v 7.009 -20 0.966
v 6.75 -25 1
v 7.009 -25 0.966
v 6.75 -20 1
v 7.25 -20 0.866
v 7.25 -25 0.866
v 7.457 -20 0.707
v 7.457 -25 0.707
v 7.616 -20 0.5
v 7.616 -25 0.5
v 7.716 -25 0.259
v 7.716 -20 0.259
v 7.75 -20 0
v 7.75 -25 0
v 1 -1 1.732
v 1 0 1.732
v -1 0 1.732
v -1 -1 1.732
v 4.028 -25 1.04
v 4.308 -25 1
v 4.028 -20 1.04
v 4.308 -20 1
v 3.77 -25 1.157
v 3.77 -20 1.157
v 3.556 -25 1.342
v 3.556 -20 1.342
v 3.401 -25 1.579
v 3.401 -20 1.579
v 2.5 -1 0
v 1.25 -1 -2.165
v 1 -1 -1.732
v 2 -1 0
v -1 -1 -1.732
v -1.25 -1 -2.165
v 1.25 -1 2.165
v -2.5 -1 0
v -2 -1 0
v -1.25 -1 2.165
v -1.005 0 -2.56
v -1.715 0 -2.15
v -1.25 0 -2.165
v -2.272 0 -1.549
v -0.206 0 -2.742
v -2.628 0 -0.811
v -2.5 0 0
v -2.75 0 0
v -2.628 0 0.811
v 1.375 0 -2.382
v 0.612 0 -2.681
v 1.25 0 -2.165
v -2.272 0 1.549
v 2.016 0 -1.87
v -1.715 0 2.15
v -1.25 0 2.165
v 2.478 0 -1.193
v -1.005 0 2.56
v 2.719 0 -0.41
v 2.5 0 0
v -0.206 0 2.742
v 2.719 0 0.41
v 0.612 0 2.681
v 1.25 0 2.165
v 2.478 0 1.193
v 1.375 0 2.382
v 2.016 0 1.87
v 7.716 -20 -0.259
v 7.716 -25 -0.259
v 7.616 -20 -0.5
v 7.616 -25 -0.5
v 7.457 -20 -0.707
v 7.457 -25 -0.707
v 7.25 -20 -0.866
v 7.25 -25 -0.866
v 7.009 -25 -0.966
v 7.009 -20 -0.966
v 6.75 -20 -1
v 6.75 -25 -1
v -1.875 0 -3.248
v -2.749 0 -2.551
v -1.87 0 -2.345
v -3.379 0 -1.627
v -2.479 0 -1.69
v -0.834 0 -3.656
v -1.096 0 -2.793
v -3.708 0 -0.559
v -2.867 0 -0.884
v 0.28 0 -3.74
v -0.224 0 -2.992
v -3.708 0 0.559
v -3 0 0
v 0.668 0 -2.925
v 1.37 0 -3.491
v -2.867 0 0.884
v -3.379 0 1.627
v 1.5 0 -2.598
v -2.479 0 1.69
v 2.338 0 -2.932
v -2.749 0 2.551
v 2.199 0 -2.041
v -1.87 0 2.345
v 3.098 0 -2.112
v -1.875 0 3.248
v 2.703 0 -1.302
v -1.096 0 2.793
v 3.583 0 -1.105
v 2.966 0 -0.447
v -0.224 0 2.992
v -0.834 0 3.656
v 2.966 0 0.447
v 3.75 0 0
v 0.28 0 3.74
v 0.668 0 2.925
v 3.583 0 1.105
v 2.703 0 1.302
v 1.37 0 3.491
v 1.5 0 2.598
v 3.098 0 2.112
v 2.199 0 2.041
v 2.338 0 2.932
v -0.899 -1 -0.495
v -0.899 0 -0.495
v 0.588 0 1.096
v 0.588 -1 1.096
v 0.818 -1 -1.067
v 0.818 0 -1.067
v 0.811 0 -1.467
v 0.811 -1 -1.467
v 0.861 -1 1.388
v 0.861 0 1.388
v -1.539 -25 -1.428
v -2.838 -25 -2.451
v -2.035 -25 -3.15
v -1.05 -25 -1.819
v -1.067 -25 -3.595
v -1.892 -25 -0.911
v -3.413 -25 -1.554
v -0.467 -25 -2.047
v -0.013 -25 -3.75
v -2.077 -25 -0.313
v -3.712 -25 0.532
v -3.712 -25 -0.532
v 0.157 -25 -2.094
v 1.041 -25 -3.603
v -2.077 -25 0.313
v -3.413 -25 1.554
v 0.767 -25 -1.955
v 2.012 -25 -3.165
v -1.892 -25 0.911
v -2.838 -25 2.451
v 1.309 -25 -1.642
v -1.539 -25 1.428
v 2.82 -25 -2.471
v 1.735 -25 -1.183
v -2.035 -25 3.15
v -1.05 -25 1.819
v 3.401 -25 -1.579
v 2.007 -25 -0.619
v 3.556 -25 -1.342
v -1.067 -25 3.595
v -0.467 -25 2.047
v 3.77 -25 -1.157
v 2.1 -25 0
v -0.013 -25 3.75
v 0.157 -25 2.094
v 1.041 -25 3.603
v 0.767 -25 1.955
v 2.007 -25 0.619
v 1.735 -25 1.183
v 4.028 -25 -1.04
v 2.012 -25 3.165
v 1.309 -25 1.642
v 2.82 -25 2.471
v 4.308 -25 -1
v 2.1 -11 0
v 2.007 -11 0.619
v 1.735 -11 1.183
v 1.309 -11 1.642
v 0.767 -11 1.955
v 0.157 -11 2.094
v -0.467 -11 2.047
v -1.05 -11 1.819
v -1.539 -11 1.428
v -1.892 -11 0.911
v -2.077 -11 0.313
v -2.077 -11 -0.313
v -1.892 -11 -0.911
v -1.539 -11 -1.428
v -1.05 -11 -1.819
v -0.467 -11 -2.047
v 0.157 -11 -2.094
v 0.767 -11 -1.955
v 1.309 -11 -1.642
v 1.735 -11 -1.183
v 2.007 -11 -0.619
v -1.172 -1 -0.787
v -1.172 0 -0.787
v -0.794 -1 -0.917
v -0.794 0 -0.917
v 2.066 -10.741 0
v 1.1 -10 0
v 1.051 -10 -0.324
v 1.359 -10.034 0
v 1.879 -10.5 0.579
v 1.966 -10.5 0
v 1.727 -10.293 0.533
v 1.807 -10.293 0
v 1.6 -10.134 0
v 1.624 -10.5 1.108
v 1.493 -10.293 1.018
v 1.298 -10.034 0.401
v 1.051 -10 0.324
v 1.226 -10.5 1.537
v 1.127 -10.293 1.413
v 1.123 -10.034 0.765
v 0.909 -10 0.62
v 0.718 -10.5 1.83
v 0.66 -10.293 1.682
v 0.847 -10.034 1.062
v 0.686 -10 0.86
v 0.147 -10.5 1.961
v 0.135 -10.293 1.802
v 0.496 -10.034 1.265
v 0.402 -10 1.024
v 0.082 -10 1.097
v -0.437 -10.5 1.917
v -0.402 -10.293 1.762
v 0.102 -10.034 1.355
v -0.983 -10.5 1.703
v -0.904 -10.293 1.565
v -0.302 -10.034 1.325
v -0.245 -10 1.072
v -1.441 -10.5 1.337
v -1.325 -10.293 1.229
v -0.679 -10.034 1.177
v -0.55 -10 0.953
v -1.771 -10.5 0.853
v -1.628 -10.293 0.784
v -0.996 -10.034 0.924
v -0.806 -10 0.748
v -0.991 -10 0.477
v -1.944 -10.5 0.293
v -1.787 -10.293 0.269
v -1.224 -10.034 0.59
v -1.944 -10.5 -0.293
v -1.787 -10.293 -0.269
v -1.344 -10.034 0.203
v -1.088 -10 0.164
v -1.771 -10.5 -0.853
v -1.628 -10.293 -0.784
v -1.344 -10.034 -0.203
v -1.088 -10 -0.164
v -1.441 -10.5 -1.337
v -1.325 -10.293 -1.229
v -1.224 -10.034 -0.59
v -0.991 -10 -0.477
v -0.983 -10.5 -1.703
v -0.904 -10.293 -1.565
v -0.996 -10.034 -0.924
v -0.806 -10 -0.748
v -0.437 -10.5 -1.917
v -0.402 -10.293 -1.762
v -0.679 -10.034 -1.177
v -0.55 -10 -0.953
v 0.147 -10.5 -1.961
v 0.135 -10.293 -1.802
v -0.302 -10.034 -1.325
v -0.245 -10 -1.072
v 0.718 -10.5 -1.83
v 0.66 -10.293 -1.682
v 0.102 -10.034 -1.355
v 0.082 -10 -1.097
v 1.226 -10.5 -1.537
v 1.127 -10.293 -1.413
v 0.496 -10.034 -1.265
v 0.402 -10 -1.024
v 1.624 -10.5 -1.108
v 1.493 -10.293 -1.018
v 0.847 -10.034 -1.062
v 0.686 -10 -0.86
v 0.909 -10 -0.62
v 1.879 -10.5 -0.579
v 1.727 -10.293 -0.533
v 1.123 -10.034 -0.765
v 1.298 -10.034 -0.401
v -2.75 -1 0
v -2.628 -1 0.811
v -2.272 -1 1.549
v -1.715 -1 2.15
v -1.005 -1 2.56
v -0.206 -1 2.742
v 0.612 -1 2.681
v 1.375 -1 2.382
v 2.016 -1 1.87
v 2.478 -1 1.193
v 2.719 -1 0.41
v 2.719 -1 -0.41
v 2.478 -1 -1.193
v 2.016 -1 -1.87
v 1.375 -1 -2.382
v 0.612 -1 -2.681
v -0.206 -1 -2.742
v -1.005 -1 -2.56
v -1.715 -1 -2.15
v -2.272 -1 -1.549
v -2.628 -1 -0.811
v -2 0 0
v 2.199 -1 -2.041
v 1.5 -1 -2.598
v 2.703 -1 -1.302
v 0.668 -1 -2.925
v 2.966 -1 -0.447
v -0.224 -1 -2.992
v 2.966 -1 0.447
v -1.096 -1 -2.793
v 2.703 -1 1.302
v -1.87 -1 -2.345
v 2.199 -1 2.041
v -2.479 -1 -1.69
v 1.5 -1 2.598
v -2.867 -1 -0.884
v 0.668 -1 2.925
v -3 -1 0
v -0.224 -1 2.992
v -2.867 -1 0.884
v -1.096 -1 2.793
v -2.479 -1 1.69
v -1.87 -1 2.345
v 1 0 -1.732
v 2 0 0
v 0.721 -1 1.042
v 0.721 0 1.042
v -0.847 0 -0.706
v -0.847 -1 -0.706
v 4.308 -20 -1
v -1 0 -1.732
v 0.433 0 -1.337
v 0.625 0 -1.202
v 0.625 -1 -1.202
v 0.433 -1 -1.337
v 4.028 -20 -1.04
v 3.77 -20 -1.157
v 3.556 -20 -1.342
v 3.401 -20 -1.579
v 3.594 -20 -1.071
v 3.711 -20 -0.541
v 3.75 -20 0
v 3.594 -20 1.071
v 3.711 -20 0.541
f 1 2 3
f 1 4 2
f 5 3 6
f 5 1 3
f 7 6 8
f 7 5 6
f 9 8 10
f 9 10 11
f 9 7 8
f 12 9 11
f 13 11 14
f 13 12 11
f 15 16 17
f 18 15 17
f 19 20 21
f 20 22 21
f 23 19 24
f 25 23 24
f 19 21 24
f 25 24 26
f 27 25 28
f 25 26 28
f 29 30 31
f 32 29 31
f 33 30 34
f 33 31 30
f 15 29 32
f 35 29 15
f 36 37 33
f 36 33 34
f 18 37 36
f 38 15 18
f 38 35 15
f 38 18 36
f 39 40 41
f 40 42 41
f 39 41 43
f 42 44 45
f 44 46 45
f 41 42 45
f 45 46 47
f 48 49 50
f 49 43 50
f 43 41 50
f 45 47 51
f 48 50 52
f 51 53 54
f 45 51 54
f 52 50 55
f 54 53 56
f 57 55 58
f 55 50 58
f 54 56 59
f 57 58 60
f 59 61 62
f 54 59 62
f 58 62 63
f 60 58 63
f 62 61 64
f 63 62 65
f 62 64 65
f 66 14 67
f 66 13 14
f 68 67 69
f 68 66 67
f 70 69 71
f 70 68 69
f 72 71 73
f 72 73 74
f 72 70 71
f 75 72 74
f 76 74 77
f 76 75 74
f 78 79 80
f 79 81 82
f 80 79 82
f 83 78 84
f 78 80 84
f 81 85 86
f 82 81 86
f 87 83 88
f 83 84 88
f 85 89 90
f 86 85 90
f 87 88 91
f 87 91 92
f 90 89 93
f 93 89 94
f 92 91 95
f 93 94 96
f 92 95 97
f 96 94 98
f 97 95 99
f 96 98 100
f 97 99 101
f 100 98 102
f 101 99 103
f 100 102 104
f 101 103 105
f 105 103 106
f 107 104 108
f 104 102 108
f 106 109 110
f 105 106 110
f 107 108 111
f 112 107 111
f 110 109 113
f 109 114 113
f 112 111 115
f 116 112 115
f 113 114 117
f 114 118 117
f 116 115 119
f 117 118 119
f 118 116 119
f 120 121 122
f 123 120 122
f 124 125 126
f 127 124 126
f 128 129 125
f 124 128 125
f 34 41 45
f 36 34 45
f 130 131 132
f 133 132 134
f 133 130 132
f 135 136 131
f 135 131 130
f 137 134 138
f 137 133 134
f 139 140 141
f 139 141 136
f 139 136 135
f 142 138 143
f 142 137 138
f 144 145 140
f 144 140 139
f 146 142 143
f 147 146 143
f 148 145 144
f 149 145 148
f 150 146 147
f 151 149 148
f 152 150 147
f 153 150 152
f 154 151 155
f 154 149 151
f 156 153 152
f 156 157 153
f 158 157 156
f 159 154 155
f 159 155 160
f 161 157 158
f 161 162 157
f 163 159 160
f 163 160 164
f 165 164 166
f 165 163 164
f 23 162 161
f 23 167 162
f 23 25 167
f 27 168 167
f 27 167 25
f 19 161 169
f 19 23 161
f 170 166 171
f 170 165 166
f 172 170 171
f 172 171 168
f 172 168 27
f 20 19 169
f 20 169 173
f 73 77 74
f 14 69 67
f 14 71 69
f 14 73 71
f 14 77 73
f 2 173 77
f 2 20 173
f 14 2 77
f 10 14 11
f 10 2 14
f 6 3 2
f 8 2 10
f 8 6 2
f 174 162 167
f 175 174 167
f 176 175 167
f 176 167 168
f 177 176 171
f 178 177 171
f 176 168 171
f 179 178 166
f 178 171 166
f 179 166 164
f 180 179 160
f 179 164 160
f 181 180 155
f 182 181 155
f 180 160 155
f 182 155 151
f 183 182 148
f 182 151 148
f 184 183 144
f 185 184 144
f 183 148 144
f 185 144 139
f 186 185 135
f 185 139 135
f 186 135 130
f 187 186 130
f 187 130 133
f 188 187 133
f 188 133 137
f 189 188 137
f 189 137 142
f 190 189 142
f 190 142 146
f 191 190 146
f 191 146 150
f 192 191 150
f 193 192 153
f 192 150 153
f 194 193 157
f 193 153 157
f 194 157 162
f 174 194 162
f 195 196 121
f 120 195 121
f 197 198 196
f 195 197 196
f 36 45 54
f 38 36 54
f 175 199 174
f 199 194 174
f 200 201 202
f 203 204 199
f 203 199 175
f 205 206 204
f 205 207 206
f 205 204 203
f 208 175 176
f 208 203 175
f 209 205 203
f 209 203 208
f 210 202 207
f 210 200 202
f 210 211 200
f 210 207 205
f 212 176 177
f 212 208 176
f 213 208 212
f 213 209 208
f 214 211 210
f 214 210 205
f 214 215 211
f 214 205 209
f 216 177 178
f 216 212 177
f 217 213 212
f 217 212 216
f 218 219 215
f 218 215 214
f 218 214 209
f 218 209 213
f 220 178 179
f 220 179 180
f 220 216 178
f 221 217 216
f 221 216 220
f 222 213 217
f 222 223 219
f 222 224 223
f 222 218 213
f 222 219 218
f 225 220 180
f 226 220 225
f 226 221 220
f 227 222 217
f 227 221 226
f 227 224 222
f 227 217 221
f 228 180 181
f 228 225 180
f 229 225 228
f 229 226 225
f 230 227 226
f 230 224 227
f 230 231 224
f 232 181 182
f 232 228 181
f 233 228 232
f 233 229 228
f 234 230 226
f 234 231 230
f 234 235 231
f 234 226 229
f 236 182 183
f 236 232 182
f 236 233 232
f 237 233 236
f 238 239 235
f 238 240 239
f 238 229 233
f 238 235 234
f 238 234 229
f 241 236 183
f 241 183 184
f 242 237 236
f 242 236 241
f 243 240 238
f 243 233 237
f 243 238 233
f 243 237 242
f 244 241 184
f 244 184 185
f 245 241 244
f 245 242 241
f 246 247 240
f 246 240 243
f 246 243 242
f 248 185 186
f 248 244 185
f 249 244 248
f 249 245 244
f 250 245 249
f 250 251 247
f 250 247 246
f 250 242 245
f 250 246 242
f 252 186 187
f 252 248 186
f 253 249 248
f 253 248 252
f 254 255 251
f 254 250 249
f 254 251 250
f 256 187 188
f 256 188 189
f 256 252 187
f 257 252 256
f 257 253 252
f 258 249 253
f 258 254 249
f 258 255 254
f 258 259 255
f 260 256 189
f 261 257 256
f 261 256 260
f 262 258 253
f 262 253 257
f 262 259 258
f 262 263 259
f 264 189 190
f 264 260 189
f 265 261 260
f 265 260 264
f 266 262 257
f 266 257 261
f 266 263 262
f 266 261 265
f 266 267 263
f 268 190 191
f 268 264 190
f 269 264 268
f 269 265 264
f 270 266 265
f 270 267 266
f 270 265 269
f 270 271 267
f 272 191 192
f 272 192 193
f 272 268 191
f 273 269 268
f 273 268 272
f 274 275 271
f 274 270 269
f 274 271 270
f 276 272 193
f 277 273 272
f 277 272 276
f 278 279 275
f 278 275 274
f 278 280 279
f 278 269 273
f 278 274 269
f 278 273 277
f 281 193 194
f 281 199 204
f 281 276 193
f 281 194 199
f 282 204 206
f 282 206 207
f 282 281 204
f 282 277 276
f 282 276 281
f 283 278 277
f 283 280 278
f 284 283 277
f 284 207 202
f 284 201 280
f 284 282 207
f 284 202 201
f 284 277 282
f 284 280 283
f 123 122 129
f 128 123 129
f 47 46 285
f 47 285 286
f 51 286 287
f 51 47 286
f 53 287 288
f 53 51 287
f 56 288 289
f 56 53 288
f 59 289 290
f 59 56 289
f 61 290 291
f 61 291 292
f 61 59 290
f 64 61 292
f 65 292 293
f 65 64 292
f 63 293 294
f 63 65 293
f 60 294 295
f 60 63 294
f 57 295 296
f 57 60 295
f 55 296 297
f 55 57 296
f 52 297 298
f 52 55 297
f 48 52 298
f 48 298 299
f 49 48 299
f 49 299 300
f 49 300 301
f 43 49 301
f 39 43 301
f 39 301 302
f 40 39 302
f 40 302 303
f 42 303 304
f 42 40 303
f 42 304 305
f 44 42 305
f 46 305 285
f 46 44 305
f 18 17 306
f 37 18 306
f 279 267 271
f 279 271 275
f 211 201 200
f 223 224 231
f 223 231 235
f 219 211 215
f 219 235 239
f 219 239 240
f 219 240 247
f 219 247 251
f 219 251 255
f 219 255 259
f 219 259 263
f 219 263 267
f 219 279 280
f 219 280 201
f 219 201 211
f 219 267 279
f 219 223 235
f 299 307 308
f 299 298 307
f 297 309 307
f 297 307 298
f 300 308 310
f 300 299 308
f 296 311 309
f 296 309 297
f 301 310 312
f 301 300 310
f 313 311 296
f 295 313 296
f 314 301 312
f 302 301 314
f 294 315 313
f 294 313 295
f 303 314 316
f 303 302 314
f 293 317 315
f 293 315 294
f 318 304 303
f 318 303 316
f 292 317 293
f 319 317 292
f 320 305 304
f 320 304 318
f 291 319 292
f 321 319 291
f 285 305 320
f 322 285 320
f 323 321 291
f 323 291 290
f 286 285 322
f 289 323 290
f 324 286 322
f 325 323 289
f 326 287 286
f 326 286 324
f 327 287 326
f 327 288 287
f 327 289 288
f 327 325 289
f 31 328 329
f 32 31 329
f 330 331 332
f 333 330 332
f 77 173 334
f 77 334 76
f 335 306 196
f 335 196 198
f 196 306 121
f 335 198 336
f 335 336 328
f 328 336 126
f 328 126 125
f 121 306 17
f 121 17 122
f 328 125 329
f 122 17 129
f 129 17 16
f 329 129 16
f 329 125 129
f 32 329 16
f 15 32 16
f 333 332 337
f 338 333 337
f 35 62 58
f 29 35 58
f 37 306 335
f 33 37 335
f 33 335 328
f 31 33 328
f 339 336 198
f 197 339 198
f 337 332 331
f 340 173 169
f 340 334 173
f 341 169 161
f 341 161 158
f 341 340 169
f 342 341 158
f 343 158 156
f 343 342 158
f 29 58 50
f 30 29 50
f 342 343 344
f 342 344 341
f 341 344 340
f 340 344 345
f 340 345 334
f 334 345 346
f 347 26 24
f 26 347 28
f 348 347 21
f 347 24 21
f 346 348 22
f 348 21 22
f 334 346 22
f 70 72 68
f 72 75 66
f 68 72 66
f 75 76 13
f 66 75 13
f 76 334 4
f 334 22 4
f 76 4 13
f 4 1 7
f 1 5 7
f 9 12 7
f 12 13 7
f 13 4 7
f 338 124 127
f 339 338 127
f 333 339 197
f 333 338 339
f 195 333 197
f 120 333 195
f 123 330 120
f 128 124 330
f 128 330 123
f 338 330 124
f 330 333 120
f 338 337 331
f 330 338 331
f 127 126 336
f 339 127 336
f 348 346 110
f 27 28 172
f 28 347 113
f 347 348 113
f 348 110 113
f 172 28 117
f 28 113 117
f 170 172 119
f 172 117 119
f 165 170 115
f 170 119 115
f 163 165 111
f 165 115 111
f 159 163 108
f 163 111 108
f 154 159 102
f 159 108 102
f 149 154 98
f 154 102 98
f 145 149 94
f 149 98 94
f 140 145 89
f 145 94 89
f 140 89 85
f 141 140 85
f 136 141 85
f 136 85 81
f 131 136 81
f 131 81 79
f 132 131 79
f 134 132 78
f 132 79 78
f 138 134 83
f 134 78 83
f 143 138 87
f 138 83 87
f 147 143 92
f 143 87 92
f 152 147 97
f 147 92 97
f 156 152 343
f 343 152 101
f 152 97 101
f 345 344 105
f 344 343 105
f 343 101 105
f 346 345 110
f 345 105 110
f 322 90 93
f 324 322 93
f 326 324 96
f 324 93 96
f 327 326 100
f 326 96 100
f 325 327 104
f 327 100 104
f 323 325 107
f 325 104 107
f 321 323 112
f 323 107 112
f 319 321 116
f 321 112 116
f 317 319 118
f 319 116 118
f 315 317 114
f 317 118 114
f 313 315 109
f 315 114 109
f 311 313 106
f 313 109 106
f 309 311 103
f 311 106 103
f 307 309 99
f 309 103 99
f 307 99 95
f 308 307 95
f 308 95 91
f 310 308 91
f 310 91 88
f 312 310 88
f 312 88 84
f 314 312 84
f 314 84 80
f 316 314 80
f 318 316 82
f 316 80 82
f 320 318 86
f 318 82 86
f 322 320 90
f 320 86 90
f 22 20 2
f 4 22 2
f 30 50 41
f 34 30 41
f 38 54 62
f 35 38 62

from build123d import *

# Parameters (mm, degrees)
F0_R     = 3.75
F1_DEPTH = 25
F2_W     = 8
F2_H     = 2
F3_DEPTH = 5
F4_R     = 0.99999
F5_R     = 2.1
F6_DEPTH = 15
F7_R     = 3
F7_R_2   = 2.75
F8_DEPTH = 1
F9_R     = 1


# Not quite as in the source:
# - a fillet or chamfer is up to 0.001 mm smaller than in the source, because OpenCascade refuses the exact size


with BuildPart() as f1:
    # F0 (on Front) → F1 (new body)
    with BuildSketch(Plane.XZ):
        Circle(F0_R)
    extrude(amount=F1_DEPTH)

    # F2 (on face) → F3 (join)
    with BuildSketch(Plane.XZ.offset(25)):
        with Locations((3.75, 0)):
            Rectangle(F2_W, F2_H)
    extrude(amount=-F3_DEPTH)

    # F4 (radius 1 in the source; OpenCascade refuses exactly that, so slightly less here)
    f4_edges = [f1.edges().sort_by_distance(p)[0] for p in [
        (3.614208, -22.5, 1),
        (3.614208, -22.5, -1),
        (7.75, -22.5, 1),
        (7.75, -22.5, -1),
    ]]
    fillet(f4_edges, radius=F4_R)

    # F5 (on face) → F6 (cut)
    with BuildSketch(Plane.XZ.offset(25)):
        Circle(F5_R)
    extrude(amount=-F6_DEPTH, mode=Mode.SUBTRACT)

    # F7 (on face) → F8 (cut)
    with BuildSketch(Plane(origin=(0, 0, 0), x_dir=(-1, 0, 0), z_dir=(0, 1, 0))):
        Circle(F7_R)
        Circle(F7_R_2, mode=Mode.SUBTRACT)
        Polygon((1.25, -2.1650635095), (2.5, 0), (1.25, 2.1650635095), (-1.25, 2.1650635095), (-2.5, 0), (-1.25, -2.1650635095), align=None)
        with BuildLine():
            ThreePointArc((1, 1.7320508076), (1.7320508076, 1), (2, 0))
            ThreePointArc((2, 0), (1.7320508076, -1), (1, -1.7320508076))
            ThreePointArc((1, -1.7320508076), (0, -2), (-1, -1.7320508076))
            ThreePointArc((-1, -1.7320508076), (-1.7320508076, -1), (-2, 0))
            ThreePointArc((-2, 0), (-1.7320508076, 1), (-1, 1.7320508076))
            ThreePointArc((-1, 1.7320508076), (0, 2), (1, 1.7320508076))
        make_face(mode=Mode.SUBTRACT)
        with BuildLine():
            Line((-2, 0), (-1, 1.7320508076))
            ThreePointArc((-1, 1.7320508076), (-1.7320508076, 1), (-2, 0))
        make_face()
        with BuildLine():
            Line((-1, 1.7320508076), (1, 1.7320508076))
            ThreePointArc((1, 1.7320508076), (0, 2), (-1, 1.7320508076))
        make_face()
        with BuildLine():
            ThreePointArc((-2, 0), (-1.7320508076, -1), (-1, -1.7320508076))
            Line((-1, -1.7320508076), (-2, 0))
        make_face()
        with BuildLine():
            ThreePointArc((1, -1.7320508076), (1.7320508076, -1), (2, 0))
            Line((2, 0), (1.5, -0.8660254038))
            Line((1.5, -0.8660254038), (1, -1.7320508076))
        make_face()
        with BuildLine():
            Line((1, 1.7320508076), (2, 0))
            ThreePointArc((2, 0), (1.7320508076, 1), (1, 1.7320508076))
        make_face()
        with BuildLine():
            ThreePointArc((-1, -1.7320508076), (0, -2), (1, -1.7320508076))
            Line((1, -1.7320508076), (-1, -1.7320508076))
        make_face()
        Polygon((0.8465453085, -0.7060742072), (0.8991730442, -0.4951797253), (-0.5881552807, 1.095739762), (-0.7212159254, 1.0418686678), align=None)
        Polygon((-0.7212159254, 1.0418686678), (-0.85427657, 0.9879975736), (-0.8180661444, -1.0666475449), (-0.6253293831, -1.2018198644), align=None)
        Polygon((-0.4325926219, -1.3369921838), (0.7939175728, -0.9169686891), (0.8465453085, -0.7060742072), (-0.6253293831, -1.2018198644), align=None)
        Polygon((-0.8180661444, -1.0666475449), (-0.8110177635, -1.4665854405), (-0.4325926219, -1.3369921838), (-0.6253293831, -1.2018198644), align=None)
        Polygon((0.7939175728, -0.9169686891), (1.1723427144, -0.7873754324), (0.8991730442, -0.4951797253), (0.8465453085, -0.7060742072), align=None)
        Polygon((-0.5881552807, 1.095739762), (-0.8613249509, 1.3879354691), (-0.85427657, 0.9879975736), (-0.7212159254, 1.0418686678), align=None)
    extrude(amount=-F8_DEPTH, mode=Mode.SUBTRACT)

    # F9
    f9_edges = [f1.edges().sort_by_distance(p)[0] for p in [
        (-2.1, -10, 0),
    ]]
    fillet(f9_edges, radius=F9_R)


solid = f1.part
